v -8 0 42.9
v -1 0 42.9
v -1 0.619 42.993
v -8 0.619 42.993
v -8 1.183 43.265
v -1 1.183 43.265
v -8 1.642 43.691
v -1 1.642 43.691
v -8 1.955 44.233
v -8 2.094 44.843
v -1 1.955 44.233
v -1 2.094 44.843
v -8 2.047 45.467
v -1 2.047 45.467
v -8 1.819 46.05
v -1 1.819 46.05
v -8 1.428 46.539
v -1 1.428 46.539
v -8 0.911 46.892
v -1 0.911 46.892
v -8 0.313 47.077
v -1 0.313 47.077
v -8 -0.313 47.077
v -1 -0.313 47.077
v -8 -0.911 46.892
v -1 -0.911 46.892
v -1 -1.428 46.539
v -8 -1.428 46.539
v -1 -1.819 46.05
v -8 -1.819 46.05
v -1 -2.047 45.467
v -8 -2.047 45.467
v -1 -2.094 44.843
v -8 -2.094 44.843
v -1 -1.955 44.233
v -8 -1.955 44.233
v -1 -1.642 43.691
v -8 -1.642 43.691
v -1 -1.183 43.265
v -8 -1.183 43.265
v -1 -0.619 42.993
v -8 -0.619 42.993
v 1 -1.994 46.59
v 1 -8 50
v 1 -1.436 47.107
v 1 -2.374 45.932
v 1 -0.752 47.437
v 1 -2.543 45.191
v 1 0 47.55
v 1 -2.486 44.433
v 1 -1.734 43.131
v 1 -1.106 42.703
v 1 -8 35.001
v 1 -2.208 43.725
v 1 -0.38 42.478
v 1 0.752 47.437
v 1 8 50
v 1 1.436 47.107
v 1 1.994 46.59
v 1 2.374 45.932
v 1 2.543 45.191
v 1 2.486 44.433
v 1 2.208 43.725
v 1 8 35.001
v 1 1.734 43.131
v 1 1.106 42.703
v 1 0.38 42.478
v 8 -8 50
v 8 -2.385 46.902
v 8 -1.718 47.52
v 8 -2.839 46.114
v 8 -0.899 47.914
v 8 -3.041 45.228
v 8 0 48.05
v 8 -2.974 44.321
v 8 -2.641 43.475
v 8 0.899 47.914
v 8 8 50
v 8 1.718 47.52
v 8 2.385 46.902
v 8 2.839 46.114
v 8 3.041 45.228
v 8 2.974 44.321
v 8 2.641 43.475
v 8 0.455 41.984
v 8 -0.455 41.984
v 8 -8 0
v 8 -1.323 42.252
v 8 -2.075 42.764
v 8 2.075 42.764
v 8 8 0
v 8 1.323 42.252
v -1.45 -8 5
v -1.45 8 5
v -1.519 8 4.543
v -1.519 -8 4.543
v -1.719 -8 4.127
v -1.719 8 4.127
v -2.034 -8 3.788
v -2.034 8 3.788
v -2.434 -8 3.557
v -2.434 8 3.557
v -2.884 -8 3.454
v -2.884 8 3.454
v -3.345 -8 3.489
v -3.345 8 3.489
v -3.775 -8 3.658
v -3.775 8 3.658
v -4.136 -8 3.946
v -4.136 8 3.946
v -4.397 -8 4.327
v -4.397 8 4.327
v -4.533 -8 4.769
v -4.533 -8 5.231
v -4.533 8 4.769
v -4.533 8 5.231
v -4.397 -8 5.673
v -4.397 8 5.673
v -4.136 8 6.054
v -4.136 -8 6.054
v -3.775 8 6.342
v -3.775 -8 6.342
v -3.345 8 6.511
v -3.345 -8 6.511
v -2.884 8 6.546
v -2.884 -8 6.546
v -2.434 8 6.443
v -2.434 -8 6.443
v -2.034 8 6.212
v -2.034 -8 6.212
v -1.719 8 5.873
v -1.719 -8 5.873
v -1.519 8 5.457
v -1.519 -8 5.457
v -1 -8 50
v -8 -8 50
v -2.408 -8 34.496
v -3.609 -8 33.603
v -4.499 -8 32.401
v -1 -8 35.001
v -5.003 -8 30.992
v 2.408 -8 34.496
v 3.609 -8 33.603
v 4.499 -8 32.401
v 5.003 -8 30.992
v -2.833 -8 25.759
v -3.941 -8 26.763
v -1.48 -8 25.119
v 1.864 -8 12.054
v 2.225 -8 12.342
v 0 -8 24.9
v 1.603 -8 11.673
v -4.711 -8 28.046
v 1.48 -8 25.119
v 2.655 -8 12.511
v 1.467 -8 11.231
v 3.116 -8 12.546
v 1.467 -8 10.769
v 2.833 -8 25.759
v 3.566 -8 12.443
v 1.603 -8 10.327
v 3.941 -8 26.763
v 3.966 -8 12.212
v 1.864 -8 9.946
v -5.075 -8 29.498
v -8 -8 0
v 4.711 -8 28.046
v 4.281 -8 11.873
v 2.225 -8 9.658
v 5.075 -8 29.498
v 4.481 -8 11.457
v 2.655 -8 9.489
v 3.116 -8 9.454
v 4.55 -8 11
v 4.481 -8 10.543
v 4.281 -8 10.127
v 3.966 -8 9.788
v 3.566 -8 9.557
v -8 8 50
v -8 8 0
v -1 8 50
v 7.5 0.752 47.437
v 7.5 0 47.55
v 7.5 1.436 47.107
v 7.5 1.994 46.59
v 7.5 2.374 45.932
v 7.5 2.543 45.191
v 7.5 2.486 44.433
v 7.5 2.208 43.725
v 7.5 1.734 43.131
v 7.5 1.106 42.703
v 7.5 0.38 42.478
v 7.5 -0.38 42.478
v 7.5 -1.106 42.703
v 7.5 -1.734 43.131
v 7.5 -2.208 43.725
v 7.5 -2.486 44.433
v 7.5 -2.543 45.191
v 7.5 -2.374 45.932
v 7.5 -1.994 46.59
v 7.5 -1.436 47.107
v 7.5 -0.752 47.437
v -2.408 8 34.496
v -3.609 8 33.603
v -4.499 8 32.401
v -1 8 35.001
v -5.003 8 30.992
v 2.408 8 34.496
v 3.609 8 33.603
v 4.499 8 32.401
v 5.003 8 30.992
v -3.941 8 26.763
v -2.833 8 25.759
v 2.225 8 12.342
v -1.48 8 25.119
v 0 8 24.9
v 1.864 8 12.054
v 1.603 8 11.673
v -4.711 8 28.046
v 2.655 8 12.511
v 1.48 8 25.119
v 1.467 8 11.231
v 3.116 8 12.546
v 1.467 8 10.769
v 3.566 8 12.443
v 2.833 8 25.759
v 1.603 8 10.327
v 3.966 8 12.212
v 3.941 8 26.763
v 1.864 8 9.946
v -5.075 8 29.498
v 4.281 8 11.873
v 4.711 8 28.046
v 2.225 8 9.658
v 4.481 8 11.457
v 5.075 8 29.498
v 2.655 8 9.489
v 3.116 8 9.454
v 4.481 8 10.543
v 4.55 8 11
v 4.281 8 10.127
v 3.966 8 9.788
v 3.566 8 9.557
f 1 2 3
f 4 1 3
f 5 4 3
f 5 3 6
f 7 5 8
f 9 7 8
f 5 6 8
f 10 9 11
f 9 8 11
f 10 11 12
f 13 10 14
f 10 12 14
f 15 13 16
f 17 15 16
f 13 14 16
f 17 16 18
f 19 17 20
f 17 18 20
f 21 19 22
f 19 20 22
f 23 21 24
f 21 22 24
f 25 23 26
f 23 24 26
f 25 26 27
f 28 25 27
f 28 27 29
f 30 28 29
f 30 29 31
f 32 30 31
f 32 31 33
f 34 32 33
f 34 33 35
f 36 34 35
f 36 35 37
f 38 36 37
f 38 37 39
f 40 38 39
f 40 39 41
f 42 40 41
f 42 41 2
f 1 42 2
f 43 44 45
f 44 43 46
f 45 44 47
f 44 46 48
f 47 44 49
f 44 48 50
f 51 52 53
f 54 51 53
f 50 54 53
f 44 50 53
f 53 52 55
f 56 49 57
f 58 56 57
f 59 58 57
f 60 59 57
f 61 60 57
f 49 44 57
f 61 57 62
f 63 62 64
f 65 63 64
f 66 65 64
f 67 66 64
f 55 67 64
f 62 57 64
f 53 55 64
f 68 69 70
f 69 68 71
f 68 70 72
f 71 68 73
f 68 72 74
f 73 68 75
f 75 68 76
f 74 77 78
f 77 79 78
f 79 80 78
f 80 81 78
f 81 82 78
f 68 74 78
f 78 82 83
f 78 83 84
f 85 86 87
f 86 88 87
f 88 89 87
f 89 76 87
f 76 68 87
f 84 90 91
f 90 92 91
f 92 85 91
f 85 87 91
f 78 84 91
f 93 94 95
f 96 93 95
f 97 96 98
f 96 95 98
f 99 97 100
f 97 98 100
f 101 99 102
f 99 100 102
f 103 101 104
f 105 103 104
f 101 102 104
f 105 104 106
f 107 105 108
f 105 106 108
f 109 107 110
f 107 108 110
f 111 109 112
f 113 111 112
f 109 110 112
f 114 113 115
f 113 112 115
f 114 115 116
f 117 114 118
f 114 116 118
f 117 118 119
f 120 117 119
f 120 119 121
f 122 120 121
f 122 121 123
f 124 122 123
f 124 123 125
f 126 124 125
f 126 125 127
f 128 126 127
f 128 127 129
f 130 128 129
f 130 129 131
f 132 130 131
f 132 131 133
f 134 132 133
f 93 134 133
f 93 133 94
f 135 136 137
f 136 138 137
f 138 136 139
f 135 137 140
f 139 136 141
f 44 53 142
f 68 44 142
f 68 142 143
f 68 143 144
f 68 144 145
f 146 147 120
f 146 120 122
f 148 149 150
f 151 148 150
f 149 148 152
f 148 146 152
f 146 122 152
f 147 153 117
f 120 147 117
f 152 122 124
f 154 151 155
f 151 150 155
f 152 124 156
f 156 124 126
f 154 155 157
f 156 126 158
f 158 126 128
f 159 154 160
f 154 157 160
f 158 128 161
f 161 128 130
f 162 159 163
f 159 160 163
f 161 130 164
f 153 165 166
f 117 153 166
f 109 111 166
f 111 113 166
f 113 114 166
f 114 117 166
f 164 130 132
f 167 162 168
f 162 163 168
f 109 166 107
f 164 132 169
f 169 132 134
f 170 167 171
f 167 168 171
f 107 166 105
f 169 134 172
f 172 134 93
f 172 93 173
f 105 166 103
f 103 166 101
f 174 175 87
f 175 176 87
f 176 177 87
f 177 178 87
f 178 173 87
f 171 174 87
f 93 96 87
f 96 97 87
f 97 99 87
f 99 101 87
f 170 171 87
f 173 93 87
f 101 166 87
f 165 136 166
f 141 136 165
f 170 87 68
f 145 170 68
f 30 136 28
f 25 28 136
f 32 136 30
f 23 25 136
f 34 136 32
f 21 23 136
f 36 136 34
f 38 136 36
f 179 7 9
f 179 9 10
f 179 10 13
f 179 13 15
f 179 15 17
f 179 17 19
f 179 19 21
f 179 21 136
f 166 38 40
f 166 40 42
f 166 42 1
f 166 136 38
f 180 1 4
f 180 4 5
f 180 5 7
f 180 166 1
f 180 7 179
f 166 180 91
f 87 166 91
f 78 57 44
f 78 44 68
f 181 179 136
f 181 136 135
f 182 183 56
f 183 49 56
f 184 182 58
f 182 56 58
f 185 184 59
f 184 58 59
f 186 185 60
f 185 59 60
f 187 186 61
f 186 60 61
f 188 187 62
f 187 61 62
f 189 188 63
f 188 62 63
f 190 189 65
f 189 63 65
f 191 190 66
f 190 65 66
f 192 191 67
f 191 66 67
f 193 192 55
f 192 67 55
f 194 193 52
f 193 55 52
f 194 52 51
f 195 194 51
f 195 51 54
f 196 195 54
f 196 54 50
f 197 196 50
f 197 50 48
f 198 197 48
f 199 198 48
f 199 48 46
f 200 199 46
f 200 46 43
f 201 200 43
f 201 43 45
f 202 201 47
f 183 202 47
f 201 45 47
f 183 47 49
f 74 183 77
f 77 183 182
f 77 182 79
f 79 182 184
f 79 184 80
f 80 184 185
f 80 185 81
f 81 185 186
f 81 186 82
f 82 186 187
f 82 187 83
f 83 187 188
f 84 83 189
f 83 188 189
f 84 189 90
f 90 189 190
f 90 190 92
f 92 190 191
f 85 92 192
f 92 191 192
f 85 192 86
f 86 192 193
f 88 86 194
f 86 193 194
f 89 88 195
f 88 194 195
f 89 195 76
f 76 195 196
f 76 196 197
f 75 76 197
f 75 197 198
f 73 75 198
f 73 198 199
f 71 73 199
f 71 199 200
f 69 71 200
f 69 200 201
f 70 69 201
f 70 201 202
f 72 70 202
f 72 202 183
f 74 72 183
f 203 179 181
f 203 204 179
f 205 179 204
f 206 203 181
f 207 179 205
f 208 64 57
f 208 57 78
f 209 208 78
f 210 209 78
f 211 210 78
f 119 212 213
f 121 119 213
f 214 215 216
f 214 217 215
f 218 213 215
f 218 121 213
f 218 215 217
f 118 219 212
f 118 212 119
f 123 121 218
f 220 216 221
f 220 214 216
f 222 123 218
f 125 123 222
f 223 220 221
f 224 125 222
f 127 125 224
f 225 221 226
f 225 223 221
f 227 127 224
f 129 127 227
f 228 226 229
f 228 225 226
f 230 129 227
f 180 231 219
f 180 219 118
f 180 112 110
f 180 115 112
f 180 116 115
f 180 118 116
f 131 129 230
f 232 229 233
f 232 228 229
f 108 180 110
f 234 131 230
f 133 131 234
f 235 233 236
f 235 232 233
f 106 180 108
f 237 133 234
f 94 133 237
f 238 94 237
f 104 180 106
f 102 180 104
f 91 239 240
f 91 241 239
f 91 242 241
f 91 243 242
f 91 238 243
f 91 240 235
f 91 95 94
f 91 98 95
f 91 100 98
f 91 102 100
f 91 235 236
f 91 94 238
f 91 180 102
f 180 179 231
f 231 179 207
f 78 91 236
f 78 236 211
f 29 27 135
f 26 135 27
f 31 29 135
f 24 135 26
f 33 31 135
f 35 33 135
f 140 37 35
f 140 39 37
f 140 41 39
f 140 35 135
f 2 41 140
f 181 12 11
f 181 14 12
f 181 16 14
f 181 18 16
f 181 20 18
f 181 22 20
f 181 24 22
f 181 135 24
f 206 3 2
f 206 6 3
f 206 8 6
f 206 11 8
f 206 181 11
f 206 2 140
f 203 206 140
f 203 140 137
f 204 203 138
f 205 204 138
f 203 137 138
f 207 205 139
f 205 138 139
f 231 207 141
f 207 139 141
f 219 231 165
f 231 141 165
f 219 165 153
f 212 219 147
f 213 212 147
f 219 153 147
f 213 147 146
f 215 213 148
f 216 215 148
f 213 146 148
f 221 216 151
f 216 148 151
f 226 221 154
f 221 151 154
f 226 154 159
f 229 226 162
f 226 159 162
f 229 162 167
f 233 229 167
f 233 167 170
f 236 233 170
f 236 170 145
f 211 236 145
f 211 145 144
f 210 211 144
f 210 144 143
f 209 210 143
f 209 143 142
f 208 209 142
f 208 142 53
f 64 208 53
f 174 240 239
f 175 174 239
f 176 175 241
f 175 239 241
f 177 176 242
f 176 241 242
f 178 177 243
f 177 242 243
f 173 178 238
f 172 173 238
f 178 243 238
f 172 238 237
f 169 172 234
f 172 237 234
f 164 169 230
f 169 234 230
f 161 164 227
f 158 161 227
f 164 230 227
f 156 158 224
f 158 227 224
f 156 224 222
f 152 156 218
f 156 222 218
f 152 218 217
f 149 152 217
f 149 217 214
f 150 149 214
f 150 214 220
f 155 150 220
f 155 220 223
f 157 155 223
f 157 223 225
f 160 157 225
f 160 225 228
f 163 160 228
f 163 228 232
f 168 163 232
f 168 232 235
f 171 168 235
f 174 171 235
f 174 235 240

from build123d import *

# Parameters (mm, degrees)
SKETCH1_W                                 = 16
SKETCH1_H                                 = 16
BASE_DEPTH                                = 50
SKETCH2_W                                 = 2
SKETCH2_H                                 = 16
RODSLOT_DEPTH                             = 54.103672189
F_5_1_5_1_FREE_HOLE_FOR_SCREW_D           = 5.1
F_5_1_5_1_FREE_HOLE_FOR_SCREW_DEPTH       = 7.5
F_5_1_5_1_FREE_HOLE_FOR_SCREW_CSINK_D     = 6.1
F_5_1_5_1_FREE_HOLE_FOR_SCREW_CSINK_ANGLE = 90
F_5_1_5_1_FREE_HOLE_FOR_SCREW_TIP         = 1.056244584
M5X0_8_TAPPED_HOLE_FOR_ROD_SCREW_D        = 4.2
M5X0_8_TAPPED_HOLE_FOR_ROD_SCREW_DEPTH    = 7.6381927
M5X0_8_TAPPED_HOLE_FOR_ROD_SCREW_TIP      = 1.2618073
F_3_1_3_1_SCREW_HOLES_D                   = 3.1
F_10_2_10_2_ROD_HOLE_D                    = 10.2


with BuildPart() as part:
    # Sketch1 → Base (new body)
    with BuildSketch(Plane.XY):
        Rectangle(SKETCH1_W, SKETCH1_H)
    extrude(amount=BASE_DEPTH)

    # Sketch2 → RodSlot (cut, through all)
    with BuildSketch(Plane(origin=(0, 8, 0), x_dir=(1, 0, 0), z_dir=(0, 1, 0))):
        with Locations((0, -42)):
            Rectangle(SKETCH2_W, SKETCH2_H)
    extrude(amount=-RODSLOT_DEPTH, mode=Mode.SUBTRACT)

    # Ø5.1 (5.1) free hole for screw
    with Locations(Plane(origin=(8, 0, 0), x_dir=(0, 0, -1), z_dir=(1, 0, 0))):
        with Locations((-45, 0)):
            CounterSinkHole(F_5_1_5_1_FREE_HOLE_FOR_SCREW_D / 2, F_5_1_5_1_FREE_HOLE_FOR_SCREW_CSINK_D / 2, depth=F_5_1_5_1_FREE_HOLE_FOR_SCREW_DEPTH, counter_sink_angle=F_5_1_5_1_FREE_HOLE_FOR_SCREW_CSINK_ANGLE)
            with Locations((0, 0, -(F_5_1_5_1_FREE_HOLE_FOR_SCREW_DEPTH + F_5_1_5_1_FREE_HOLE_FOR_SCREW_TIP / 2))):  # 135° drill point
                Cone(0, F_5_1_5_1_FREE_HOLE_FOR_SCREW_D / 2, F_5_1_5_1_FREE_HOLE_FOR_SCREW_TIP, mode=Mode.SUBTRACT)

    # M5x0.8 Tapped Hole for rod screw
    with Locations(Plane.ZY.offset(8)):
        with Locations((45, 0)):
            Hole(M5X0_8_TAPPED_HOLE_FOR_ROD_SCREW_D / 2, depth=M5X0_8_TAPPED_HOLE_FOR_ROD_SCREW_DEPTH)
            with Locations((0, 0, -(M5X0_8_TAPPED_HOLE_FOR_ROD_SCREW_DEPTH + M5X0_8_TAPPED_HOLE_FOR_ROD_SCREW_TIP / 2))):  # 118° drill point
                Cone(0, M5X0_8_TAPPED_HOLE_FOR_ROD_SCREW_D / 2, M5X0_8_TAPPED_HOLE_FOR_ROD_SCREW_TIP, mode=Mode.SUBTRACT)

    # Ø3.1 (3.1) screw holes (through all)
    with Locations(Plane(origin=(0, -8, 0), x_dir=(-1, 0, 0), z_dir=(0, -1, 0))):
        with Locations((3, -5), (-3, -11)):
            Hole(F_3_1_3_1_SCREW_HOLES_D / 2)

    # Ø10.2 (10.2) Rod Hole (through all)
    with Locations(Plane(origin=(0, 8, 0), x_dir=(1, 0, 0), z_dir=(0, 1, 0))):
        with Locations((0, -30)):
            Hole(F_10_2_10_2_ROD_HOLE_D / 2)


solid = part.part
